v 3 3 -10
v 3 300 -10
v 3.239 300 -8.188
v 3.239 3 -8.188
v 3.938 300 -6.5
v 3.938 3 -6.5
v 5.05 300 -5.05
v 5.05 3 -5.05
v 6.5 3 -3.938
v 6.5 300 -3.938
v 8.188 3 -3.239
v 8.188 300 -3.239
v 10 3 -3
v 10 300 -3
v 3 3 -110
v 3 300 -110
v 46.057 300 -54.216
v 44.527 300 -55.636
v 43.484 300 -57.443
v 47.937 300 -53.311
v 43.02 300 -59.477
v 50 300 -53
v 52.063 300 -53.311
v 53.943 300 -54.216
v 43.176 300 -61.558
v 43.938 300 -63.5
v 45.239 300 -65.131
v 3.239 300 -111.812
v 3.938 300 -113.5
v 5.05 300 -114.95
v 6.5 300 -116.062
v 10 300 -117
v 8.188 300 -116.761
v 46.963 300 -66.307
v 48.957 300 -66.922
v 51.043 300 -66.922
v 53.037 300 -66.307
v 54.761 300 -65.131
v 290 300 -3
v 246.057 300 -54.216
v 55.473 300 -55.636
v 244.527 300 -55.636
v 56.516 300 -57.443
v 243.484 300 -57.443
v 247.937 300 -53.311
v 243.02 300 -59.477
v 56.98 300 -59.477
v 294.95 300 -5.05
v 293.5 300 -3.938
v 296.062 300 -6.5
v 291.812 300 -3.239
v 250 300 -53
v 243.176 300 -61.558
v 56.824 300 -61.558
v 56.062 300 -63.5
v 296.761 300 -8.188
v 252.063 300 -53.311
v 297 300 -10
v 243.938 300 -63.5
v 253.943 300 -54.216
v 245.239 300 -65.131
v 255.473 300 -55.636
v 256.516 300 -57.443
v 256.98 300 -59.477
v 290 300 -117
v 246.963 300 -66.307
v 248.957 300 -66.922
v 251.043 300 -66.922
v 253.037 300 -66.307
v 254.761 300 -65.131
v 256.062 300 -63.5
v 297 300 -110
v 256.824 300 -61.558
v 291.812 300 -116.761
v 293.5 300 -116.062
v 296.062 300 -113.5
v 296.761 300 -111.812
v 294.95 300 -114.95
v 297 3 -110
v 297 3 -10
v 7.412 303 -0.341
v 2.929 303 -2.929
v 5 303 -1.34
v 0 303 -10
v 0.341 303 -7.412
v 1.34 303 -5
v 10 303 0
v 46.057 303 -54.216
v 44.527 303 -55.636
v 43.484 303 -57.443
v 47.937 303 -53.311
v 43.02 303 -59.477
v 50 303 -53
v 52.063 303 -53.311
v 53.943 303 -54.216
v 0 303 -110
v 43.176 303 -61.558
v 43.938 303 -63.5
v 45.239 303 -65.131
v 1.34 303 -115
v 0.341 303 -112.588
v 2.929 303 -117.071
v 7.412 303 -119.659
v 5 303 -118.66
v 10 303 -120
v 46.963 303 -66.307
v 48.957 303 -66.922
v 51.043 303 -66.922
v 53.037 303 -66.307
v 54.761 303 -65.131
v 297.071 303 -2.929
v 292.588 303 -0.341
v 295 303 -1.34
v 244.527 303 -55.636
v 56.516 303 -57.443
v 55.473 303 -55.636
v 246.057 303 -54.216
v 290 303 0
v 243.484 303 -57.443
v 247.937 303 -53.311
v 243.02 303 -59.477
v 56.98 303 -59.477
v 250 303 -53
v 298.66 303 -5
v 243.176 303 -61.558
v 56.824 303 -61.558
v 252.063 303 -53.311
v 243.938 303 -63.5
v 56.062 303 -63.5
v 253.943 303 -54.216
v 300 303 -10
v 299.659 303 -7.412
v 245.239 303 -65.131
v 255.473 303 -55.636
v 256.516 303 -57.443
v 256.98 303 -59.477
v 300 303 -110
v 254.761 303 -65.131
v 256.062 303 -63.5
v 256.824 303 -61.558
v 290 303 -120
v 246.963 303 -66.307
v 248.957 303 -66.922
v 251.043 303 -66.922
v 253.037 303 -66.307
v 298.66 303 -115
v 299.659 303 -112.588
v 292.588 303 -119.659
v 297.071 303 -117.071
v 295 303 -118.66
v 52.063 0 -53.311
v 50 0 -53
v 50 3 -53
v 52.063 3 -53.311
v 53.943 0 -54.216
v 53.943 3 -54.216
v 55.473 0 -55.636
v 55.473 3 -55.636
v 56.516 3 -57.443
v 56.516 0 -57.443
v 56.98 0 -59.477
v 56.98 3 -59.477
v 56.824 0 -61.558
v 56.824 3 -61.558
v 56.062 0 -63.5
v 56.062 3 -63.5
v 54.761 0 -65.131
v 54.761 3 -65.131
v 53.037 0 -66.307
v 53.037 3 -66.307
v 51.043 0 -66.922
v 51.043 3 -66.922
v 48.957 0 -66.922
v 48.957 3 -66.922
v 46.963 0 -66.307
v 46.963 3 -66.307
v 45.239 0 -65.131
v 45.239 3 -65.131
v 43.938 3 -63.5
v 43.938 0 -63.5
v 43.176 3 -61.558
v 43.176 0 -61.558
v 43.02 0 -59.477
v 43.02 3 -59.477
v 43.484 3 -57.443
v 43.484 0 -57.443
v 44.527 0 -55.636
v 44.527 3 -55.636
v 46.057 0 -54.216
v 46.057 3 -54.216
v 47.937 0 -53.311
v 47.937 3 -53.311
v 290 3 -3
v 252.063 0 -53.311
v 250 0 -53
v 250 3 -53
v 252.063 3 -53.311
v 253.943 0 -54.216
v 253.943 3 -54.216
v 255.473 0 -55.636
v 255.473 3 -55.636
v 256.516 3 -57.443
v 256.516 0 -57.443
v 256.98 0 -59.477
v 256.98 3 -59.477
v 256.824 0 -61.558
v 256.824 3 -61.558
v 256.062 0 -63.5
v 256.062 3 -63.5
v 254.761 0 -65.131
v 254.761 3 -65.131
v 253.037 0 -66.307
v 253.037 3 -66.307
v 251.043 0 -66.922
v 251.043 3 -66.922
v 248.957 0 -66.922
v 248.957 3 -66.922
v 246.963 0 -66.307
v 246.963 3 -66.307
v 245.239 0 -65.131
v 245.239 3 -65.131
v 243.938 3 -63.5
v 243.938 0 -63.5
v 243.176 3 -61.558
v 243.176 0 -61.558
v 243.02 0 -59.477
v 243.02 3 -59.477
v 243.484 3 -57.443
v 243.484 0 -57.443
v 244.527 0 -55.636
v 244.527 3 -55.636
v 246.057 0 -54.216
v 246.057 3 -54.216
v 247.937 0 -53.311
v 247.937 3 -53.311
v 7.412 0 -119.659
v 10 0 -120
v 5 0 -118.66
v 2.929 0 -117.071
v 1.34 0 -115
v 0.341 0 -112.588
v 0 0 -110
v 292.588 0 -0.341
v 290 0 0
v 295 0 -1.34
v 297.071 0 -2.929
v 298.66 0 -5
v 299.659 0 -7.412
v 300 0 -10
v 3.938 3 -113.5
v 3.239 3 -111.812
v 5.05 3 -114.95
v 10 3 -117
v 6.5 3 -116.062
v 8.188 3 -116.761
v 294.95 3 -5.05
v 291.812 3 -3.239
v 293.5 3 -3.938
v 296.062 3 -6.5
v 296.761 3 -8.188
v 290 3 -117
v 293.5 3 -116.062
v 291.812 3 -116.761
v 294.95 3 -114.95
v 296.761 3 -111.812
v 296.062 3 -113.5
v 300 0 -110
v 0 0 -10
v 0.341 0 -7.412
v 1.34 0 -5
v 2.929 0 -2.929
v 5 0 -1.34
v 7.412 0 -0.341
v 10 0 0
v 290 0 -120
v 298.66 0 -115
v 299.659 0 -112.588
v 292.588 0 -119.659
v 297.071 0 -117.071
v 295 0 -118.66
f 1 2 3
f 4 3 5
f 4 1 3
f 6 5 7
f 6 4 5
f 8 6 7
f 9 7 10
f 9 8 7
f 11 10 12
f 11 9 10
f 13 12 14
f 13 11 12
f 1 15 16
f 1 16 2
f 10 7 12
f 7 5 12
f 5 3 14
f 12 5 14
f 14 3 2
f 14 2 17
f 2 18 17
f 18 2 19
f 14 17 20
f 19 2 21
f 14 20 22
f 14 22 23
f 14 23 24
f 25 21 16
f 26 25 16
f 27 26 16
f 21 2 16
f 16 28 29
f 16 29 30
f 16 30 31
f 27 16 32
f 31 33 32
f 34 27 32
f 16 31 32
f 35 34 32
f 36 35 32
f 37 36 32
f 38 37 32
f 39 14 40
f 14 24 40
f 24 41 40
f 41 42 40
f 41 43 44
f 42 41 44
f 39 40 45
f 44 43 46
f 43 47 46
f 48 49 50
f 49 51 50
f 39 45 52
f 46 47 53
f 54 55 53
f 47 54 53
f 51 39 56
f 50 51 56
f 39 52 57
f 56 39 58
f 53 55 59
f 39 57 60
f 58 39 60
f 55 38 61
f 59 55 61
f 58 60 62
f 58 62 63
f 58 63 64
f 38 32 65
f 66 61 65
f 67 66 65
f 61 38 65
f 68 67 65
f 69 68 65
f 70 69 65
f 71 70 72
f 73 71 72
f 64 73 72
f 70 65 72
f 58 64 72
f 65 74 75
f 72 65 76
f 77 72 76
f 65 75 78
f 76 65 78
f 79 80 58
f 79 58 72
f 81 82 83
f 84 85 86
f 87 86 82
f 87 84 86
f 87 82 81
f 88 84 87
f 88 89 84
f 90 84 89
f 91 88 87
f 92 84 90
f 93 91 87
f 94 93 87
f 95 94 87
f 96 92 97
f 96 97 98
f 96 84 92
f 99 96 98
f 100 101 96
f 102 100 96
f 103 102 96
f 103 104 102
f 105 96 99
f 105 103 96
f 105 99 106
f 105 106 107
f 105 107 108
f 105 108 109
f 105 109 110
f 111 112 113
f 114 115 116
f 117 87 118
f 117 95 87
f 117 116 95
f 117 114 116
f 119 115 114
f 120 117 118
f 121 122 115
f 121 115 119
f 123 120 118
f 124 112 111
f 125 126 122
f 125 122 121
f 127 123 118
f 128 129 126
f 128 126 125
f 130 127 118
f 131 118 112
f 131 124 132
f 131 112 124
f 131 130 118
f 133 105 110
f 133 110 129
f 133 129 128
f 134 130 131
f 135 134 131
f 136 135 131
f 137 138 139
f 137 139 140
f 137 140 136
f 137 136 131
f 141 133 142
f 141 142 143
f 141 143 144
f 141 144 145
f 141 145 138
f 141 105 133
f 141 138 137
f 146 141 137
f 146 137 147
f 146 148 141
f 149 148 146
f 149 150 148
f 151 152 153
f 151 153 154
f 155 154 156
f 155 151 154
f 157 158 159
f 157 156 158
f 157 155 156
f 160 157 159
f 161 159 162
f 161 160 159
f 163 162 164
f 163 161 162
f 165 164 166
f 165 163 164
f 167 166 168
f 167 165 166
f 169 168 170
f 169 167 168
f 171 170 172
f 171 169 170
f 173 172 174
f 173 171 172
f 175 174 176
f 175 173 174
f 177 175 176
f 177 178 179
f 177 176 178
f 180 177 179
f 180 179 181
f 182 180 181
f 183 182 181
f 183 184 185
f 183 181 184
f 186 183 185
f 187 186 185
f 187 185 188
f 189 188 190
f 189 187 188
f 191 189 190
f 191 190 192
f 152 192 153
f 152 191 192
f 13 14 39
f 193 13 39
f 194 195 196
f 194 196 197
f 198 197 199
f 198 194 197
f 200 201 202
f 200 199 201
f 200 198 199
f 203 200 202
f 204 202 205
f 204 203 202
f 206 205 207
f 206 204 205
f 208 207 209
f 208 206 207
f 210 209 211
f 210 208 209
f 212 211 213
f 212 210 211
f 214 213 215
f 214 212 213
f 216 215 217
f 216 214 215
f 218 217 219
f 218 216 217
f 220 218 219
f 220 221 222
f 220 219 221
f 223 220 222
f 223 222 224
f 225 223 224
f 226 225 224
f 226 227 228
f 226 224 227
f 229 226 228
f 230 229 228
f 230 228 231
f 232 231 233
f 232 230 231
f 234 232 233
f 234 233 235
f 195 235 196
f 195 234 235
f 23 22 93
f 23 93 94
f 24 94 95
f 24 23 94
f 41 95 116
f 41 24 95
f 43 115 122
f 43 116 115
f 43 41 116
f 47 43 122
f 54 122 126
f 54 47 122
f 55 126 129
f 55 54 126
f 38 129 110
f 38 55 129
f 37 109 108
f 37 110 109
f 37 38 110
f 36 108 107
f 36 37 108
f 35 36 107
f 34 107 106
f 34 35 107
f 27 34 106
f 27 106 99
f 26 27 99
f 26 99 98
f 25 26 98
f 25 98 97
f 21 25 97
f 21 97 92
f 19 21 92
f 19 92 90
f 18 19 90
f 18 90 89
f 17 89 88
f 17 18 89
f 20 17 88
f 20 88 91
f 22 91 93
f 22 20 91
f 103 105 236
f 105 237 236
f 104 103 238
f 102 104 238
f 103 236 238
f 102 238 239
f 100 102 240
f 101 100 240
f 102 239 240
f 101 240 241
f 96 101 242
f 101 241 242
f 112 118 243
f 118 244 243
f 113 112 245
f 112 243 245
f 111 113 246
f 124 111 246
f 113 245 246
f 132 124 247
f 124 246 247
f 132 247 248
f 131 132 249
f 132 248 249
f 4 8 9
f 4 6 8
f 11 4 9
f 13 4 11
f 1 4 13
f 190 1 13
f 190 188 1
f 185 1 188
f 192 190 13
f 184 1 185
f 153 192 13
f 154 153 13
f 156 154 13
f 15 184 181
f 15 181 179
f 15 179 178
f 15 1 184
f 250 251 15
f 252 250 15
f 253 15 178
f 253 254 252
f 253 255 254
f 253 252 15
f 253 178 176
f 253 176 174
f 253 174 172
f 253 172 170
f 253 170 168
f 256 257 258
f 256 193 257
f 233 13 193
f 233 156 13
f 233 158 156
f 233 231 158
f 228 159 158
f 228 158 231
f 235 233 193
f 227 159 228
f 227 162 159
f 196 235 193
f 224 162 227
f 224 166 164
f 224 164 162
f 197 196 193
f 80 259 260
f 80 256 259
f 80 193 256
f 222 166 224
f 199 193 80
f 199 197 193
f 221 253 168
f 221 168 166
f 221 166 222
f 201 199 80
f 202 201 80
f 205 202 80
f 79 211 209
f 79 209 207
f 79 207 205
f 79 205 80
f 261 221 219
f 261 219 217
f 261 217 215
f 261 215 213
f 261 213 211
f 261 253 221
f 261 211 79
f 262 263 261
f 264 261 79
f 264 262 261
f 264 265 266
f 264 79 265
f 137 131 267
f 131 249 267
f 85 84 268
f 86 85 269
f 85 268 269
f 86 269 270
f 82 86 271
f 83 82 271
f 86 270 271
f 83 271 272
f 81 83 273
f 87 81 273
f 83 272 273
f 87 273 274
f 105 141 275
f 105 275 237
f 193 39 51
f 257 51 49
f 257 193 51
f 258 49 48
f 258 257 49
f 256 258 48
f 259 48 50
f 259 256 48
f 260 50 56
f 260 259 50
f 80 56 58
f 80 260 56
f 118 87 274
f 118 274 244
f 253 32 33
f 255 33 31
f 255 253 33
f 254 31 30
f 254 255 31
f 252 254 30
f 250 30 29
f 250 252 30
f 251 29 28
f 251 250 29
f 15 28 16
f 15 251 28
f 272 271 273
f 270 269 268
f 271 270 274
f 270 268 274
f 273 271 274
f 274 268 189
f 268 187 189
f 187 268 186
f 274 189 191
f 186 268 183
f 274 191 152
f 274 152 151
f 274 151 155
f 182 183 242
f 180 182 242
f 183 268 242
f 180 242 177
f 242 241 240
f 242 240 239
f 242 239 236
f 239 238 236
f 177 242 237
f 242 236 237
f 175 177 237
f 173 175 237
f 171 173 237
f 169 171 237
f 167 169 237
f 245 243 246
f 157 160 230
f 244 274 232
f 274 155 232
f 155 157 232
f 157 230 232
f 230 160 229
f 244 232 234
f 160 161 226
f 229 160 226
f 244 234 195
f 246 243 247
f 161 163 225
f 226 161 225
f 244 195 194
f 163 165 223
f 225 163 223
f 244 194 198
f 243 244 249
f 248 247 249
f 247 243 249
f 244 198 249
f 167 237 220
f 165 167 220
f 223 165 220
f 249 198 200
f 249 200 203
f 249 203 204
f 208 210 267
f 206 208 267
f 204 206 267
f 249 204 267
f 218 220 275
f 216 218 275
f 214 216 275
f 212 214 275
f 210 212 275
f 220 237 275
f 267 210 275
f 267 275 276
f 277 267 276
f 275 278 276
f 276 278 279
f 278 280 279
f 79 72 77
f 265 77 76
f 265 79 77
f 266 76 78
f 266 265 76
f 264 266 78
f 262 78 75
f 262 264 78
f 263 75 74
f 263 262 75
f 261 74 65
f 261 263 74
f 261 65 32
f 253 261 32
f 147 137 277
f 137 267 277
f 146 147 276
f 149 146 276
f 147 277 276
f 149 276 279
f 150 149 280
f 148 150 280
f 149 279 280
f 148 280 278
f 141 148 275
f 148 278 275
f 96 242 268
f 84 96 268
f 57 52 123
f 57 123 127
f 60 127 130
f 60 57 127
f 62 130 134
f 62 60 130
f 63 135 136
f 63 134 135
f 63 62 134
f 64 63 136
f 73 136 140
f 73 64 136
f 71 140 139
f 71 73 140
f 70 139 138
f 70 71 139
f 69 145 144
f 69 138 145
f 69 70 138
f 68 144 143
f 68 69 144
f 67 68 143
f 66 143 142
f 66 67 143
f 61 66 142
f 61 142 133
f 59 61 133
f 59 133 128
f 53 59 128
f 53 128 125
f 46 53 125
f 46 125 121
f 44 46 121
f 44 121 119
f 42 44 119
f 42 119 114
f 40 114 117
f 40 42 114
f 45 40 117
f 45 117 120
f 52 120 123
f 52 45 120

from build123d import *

# Parameters (mm, degrees)
BOSS_EXTRUDE1_DEPTH     = 300
SHELL5_T                = -3
BOSS_EXTRUDE2_DEPTH     = 3
CUT_EXTRUDE1_DEPTH      = 443.954850972
CUT_EXTRUDE1_DEPTH_BACK = 443.954850972
SKETCH4_R               = 7


with BuildPart() as part:
    # Sketch2 → Boss-Extrude1 (new body)
    with BuildSketch(Plane(origin=(0, 0, 0), x_dir=(1, 0, 0), z_dir=(0, 1, 0))):
        with BuildLine():
            Line((10, 0), (290, 0))
            ThreePointArc((290, 0), (297.071067812, 2.928932188), (300, 10))
            Line((300, 10), (300, 110))
            ThreePointArc((300, 110), (297.071067812, 117.071067812), (290, 120))
            Line((290, 120), (10, 120))
            ThreePointArc((10, 120), (2.928932188, 117.071067812), (0, 110))
            Line((0, 110), (0, 10))
            ThreePointArc((0, 10), (2.928932188, 2.928932188), (10, 0))
        make_face()
    extrude(amount=BOSS_EXTRUDE1_DEPTH)

    # Shell5
    shell5_openings = [part.faces().sort_by_distance(p)[0] for p in [
        (150, 300, -60),
    ]]
    offset(amount=SHELL5_T, openings=shell5_openings, kind=Kind.INTERSECTION)

    # Sketch3 → Boss-Extrude2 (add)
    with BuildSketch(Plane(origin=(0, 300, 0), x_dir=(1, 0, 0), z_dir=(0, 1, 0))):
        with BuildLine():
            Line((10, 0), (290, 0))
            ThreePointArc((290, 0), (297.071067812, 2.928932188), (300, 10))
            Line((300, 10), (300, 110))
            ThreePointArc((300, 110), (297.071067812, 117.071067812), (290, 120))
            Line((290, 120), (10, 120))
            ThreePointArc((10, 120), (2.928932188, 117.071067812), (0, 110))
            Line((0, 110), (0, 10))
            ThreePointArc((0, 10), (2.928932188, 2.928932188), (10, 0))
        make_face()
    extrude(amount=BOSS_EXTRUDE2_DEPTH)

    # Sketch4 → Cut-Extrude1 (cut, two sides: drawn at the far end of the back side and taken through both)
    with BuildSketch(Plane(origin=(0, 303, 0), x_dir=(1, 0, 0), z_dir=(0, 1, 0)).offset(-CUT_EXTRUDE1_DEPTH_BACK)):
        with Locations(Location((50, 60, 0), (0, 0, 270))):
            Circle(SKETCH4_R)
        with Locations(Location((250, 60, 0), (0, 0, 270))):
            Circle(SKETCH4_R)
    extrude(amount=CUT_EXTRUDE1_DEPTH + CUT_EXTRUDE1_DEPTH_BACK, mode=Mode.SUBTRACT)


solid = part.part
